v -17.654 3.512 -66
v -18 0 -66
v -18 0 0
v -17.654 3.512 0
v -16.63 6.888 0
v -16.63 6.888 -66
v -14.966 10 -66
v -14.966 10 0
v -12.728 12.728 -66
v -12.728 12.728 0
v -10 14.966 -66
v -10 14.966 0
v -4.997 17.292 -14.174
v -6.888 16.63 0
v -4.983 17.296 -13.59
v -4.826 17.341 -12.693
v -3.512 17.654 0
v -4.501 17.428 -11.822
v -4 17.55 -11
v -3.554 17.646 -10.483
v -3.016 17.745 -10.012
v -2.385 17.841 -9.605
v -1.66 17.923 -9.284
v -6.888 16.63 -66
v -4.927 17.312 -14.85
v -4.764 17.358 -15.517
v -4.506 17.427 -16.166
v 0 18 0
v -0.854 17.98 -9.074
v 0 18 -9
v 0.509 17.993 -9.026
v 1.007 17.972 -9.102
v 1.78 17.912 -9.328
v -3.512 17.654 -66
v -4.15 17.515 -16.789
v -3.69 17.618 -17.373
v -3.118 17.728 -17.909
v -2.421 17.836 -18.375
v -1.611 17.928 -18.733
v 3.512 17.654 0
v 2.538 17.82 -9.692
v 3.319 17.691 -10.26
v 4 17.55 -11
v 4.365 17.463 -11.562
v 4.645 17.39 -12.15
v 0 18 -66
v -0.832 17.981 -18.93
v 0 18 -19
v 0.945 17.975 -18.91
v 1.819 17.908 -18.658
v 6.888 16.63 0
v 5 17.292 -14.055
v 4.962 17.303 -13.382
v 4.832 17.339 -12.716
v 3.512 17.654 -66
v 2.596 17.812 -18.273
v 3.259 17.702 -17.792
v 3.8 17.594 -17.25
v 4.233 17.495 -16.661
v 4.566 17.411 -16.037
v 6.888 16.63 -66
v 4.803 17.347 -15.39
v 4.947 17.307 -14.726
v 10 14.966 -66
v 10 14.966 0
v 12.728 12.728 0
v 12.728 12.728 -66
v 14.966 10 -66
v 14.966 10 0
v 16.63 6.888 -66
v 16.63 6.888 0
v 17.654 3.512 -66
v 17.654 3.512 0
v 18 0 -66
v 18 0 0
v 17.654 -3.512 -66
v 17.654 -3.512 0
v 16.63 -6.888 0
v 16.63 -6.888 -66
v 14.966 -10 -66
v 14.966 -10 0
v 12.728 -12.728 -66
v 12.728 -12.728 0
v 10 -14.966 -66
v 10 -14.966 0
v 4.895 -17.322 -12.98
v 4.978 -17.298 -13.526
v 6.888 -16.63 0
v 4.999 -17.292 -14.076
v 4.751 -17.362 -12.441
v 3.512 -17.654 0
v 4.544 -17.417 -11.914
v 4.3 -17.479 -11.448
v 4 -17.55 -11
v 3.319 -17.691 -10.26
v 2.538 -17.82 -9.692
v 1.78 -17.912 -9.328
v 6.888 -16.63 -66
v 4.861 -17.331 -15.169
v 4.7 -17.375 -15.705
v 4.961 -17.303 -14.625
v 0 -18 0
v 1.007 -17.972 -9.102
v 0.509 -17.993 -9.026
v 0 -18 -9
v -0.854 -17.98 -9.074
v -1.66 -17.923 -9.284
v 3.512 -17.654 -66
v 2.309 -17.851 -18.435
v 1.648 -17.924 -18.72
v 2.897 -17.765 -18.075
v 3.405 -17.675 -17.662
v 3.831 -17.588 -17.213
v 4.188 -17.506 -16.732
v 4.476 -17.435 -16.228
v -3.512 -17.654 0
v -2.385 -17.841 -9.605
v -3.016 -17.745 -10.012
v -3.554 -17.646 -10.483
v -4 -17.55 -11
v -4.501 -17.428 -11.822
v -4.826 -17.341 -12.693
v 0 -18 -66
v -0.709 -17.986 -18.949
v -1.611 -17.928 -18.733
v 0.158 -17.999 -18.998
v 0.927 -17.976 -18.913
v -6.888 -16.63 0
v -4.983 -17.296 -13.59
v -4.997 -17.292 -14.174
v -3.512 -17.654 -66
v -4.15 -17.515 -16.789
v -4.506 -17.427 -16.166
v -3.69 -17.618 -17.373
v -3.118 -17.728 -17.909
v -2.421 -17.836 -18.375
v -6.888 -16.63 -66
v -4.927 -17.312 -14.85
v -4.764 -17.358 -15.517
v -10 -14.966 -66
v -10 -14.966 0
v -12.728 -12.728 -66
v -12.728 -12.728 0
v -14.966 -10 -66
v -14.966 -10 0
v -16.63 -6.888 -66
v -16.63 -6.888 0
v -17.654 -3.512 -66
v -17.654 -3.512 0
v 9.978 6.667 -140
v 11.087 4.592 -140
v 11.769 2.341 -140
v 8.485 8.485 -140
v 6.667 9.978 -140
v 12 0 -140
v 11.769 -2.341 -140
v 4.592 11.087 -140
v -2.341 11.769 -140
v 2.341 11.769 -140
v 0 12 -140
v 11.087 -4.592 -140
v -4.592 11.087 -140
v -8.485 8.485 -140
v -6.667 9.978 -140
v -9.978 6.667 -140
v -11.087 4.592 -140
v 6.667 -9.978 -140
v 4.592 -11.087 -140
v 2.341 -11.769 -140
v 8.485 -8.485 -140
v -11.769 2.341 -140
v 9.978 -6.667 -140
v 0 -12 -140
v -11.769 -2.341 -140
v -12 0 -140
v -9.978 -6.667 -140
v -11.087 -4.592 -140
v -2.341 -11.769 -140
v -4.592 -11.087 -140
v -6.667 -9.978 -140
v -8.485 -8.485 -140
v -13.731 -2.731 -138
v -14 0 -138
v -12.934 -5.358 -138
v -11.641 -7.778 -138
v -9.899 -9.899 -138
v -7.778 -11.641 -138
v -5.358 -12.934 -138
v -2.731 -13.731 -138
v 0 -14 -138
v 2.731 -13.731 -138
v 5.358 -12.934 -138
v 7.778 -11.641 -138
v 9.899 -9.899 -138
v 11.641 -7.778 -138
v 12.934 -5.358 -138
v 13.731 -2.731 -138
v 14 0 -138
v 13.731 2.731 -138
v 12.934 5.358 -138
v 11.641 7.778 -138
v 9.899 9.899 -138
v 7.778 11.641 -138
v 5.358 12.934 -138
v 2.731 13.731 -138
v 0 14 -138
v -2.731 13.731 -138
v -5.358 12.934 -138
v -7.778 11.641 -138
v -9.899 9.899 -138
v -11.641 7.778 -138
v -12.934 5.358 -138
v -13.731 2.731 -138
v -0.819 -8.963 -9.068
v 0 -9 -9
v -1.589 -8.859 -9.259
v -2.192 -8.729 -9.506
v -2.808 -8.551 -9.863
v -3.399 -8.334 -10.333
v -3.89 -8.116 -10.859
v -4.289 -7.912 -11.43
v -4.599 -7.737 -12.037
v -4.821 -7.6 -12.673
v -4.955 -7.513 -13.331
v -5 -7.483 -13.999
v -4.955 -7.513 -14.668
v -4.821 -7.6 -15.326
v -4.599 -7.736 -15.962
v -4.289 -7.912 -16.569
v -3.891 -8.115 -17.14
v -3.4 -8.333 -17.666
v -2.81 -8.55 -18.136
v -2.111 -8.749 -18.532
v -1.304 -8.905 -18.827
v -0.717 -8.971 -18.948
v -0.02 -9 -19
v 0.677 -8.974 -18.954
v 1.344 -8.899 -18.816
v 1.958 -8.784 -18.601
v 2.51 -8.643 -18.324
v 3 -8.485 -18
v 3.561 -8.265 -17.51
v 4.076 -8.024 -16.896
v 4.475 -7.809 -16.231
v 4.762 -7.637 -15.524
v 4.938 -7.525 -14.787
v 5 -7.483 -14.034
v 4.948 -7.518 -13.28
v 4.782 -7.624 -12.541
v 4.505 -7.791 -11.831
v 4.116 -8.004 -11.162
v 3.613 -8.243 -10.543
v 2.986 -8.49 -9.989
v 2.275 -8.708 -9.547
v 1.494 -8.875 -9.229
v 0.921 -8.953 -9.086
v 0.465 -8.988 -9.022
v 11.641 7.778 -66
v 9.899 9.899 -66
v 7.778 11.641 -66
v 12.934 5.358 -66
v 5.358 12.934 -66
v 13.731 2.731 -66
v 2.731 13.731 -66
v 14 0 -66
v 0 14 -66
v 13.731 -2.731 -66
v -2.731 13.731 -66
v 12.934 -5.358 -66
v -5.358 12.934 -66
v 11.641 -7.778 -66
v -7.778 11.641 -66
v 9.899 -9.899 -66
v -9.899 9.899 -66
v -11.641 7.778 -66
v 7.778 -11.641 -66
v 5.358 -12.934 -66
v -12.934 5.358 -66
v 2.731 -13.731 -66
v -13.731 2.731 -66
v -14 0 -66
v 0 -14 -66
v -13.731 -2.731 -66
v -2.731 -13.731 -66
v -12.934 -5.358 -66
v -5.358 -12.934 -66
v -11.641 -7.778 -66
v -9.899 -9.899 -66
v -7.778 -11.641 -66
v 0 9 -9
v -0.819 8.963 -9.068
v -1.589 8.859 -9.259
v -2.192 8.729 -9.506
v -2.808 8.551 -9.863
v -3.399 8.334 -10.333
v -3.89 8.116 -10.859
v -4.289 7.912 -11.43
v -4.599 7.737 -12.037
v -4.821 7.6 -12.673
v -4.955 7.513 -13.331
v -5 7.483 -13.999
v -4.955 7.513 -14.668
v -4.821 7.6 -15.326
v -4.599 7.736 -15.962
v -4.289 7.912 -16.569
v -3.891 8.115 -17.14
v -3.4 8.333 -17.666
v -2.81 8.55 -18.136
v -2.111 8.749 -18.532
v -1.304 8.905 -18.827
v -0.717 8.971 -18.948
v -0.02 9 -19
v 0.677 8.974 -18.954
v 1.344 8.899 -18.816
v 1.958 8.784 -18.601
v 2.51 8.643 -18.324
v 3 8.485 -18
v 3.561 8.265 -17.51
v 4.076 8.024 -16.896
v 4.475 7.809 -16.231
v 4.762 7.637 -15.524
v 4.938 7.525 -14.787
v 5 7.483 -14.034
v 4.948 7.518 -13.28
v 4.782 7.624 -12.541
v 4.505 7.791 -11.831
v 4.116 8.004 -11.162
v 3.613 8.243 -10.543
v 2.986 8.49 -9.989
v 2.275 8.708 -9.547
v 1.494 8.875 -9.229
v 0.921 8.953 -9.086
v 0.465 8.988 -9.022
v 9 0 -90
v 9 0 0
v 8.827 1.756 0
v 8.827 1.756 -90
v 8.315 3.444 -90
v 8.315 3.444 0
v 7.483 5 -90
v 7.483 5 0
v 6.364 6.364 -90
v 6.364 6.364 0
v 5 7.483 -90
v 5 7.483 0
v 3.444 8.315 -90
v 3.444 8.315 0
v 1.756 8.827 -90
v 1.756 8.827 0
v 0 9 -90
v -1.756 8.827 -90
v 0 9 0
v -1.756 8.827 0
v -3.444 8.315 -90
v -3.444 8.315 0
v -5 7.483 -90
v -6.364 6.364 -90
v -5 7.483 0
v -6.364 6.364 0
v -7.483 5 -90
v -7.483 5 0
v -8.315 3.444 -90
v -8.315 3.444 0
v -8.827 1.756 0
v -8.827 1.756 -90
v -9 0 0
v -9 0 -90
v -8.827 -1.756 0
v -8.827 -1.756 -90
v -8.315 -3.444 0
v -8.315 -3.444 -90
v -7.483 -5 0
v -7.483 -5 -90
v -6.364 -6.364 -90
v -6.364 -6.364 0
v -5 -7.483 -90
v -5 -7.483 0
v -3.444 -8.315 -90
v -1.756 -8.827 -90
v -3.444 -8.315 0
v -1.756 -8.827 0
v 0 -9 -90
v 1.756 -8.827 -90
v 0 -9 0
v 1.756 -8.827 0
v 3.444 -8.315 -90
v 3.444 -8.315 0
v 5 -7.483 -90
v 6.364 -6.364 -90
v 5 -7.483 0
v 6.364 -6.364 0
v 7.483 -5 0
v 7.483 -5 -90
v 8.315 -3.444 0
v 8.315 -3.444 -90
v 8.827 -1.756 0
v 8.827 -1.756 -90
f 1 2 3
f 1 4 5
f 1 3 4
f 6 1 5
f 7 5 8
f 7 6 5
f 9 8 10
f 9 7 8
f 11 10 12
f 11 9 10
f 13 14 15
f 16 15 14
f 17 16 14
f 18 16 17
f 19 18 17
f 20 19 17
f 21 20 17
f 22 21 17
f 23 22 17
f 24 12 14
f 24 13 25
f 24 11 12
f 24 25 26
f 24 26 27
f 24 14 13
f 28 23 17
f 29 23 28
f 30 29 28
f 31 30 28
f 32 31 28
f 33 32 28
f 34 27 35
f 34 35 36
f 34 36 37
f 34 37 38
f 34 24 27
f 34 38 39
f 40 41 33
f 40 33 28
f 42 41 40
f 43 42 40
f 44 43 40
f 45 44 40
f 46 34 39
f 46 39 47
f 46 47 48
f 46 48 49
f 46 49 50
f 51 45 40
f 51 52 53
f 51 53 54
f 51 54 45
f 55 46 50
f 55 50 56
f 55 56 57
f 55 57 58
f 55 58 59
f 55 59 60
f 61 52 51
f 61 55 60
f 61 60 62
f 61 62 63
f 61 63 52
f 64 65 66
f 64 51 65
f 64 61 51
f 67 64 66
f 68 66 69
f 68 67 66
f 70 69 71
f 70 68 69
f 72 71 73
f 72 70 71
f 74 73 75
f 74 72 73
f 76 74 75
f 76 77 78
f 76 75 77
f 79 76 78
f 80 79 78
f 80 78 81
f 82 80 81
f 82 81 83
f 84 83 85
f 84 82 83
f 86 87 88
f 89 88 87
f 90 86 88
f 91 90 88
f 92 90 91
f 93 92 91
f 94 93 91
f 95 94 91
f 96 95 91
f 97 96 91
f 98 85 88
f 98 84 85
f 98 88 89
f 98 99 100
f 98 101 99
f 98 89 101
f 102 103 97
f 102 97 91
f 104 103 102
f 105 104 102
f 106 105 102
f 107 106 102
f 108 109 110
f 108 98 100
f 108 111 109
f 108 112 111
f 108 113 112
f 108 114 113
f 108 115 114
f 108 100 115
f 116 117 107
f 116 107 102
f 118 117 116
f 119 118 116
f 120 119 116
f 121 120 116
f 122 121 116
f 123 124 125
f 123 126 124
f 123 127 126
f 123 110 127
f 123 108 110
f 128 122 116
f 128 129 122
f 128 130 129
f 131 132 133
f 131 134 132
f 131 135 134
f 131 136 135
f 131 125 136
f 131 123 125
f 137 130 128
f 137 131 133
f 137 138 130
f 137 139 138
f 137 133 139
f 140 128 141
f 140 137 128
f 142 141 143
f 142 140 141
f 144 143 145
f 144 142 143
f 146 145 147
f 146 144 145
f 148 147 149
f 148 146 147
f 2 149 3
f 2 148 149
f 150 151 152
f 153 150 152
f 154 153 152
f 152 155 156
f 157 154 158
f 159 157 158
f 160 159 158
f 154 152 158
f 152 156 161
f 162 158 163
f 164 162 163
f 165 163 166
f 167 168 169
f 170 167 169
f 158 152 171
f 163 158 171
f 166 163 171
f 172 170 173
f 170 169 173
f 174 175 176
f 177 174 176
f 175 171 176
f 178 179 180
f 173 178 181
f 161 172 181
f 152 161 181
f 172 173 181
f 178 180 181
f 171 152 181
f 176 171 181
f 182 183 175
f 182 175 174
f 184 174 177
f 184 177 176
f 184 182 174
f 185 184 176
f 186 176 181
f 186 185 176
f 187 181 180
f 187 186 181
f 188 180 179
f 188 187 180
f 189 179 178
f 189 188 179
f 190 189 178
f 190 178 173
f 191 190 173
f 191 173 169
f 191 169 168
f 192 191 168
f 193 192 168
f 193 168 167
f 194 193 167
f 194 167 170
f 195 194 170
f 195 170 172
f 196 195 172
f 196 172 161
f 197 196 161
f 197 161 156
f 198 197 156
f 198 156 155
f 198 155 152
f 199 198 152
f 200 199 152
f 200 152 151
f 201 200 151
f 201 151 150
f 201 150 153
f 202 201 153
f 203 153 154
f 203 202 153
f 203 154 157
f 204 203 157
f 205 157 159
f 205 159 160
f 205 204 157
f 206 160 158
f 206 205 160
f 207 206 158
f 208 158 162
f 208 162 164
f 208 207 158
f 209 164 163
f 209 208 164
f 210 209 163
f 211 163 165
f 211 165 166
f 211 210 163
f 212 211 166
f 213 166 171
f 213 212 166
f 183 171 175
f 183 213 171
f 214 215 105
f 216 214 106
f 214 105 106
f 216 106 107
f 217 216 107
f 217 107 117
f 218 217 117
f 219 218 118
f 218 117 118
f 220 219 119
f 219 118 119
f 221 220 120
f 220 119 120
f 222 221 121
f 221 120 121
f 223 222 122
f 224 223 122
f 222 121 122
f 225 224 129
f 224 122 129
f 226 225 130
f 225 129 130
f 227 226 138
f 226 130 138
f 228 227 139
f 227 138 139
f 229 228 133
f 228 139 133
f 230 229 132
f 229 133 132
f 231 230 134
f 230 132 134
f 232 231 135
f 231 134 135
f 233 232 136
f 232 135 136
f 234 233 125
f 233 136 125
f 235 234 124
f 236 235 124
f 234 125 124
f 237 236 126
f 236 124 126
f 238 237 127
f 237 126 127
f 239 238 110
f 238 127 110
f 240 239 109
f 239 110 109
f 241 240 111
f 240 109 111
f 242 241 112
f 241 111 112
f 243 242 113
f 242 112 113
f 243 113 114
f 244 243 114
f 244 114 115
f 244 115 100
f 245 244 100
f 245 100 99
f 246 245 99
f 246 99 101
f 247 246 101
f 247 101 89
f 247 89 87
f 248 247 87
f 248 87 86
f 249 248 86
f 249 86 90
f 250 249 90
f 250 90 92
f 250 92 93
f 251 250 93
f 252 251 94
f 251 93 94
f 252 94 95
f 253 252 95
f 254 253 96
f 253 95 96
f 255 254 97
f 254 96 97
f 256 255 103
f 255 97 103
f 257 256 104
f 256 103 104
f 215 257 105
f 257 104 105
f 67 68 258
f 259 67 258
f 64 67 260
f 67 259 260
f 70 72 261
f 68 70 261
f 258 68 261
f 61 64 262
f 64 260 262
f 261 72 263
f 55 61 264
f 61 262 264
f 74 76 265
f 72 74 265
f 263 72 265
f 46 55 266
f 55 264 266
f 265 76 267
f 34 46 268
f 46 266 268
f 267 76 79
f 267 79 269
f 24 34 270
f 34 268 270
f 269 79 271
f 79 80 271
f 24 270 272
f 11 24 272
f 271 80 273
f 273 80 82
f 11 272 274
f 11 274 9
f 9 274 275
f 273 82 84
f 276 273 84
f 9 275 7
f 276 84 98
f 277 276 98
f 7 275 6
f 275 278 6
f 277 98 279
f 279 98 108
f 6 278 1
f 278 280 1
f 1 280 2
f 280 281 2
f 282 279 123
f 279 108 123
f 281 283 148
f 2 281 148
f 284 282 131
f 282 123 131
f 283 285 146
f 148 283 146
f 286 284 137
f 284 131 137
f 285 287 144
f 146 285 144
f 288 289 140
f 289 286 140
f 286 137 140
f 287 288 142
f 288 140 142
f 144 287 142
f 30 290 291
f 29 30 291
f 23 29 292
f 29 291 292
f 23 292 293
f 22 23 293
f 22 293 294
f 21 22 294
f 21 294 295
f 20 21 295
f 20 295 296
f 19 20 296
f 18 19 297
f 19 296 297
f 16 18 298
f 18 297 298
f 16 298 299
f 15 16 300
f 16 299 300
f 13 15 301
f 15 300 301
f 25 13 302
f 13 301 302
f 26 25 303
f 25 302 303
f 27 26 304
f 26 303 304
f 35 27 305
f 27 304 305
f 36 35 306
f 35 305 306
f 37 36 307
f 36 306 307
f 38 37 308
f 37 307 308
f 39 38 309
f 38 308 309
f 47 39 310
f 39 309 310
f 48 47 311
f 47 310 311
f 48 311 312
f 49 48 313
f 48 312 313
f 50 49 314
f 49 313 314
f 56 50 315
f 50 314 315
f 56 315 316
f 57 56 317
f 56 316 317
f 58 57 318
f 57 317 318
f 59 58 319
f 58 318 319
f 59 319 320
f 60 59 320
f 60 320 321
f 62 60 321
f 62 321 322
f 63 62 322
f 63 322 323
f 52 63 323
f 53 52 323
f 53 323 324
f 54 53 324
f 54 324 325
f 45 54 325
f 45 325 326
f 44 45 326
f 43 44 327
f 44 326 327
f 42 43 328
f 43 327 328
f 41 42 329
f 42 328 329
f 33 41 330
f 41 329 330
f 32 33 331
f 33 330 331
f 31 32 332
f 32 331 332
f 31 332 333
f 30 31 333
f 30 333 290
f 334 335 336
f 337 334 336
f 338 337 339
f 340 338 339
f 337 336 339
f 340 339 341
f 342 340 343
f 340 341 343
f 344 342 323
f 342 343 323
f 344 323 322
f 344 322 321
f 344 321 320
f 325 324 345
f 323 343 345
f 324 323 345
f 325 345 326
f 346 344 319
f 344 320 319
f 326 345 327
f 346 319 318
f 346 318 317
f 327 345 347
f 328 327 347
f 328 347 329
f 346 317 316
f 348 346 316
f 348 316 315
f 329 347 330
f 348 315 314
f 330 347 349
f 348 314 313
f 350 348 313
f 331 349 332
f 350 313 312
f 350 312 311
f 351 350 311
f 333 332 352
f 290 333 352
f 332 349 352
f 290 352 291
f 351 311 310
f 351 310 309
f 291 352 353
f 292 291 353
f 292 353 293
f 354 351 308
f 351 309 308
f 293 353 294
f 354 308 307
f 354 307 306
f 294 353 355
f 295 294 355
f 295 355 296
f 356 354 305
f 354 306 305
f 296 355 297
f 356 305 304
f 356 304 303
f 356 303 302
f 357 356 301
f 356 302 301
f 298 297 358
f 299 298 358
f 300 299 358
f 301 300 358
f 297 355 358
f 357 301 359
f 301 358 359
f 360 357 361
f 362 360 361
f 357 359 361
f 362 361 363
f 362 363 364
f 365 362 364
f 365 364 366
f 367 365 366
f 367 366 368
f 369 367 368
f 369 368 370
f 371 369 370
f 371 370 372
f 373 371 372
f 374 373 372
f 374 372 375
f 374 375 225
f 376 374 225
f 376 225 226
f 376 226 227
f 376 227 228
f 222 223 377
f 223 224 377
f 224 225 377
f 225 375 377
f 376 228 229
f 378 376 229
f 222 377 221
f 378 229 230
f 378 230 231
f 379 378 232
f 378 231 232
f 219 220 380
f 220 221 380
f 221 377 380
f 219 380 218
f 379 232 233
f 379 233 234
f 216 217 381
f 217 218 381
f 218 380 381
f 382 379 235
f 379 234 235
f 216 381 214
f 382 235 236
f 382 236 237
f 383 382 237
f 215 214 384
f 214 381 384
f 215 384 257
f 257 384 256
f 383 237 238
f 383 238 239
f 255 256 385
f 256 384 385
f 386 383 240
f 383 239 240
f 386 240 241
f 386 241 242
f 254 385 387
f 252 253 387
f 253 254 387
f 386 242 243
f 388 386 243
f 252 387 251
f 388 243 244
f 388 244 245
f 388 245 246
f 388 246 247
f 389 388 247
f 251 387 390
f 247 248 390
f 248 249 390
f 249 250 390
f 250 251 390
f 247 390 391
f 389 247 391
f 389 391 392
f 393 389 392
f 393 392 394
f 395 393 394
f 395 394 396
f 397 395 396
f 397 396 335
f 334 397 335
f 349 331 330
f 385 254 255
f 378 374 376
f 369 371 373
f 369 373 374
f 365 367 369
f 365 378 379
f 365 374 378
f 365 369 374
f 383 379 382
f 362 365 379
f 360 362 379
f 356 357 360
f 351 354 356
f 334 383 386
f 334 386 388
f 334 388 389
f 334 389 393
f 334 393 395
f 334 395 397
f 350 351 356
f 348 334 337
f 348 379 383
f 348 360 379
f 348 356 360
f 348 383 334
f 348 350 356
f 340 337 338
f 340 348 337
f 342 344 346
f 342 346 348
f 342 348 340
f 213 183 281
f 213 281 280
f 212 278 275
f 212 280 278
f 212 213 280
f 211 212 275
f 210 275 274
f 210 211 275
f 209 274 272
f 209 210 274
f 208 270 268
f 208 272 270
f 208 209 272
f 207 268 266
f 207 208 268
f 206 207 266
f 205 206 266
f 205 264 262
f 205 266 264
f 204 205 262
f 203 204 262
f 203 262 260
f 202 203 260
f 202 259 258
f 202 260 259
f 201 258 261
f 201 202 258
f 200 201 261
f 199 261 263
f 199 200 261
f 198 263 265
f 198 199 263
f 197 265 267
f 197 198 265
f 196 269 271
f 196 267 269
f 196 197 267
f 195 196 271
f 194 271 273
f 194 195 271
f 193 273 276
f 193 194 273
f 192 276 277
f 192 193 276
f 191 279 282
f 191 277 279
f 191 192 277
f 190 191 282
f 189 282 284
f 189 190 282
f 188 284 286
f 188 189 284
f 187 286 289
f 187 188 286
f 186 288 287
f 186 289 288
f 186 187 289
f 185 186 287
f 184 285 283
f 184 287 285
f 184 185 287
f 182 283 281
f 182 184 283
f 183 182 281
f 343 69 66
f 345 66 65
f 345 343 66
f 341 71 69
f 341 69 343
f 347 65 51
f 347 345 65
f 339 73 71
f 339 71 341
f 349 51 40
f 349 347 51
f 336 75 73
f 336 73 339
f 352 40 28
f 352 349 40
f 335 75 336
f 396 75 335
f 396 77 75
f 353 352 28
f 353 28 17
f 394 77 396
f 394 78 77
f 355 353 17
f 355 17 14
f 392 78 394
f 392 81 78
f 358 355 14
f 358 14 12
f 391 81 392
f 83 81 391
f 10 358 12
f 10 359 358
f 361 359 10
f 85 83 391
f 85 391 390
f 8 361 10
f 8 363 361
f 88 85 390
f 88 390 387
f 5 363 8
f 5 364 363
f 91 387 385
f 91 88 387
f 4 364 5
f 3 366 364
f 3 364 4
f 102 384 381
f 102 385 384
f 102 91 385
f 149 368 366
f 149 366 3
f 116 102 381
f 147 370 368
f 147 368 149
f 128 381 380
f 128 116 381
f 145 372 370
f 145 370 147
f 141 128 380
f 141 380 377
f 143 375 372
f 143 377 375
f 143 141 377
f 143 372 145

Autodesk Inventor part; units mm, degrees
ref_plane "YZ Plane" through (0, 0, 0) normal (1, 0, 0) x (0, 1, 0)
ref_plane "XY Plane" through (0, 0, 0) normal (0, 0, 1) x (1, 0, 0)
sketch "Skizze1" plane through (0, 0, 0) normal (0, 1, 0) x (-1, 0, 0)
  line L0 (0, 0) -> (18, 0)
  line L1 (18, 0) -> (18, -5)
  line L2 (18, -5) -> (18, -5)
  line L3 (18, -5) -> (18, -11)
  line L4 (18, -11) -> (18, -11)
  line L5 (18, -11) -> (18, -66)
  line L6 (18, -66) -> (14, -66)
  line L7 (14, -66) -> (14, -140)
  line L8 (14, -140) -> (0, -140)
  line L9 (0, -140) -> (0, 0)
  point P0 (18, -8)
  dimension "d0" = 74
  dimension "d1" = 66
  dimension "d5" = 36
  dimension "d6" = 28
revolve "Umdrehung1" add sketch "Skizze1" angle 360 about axis through (0, 0, -140) along (0, 0, 1)
ref_plane "Arbeitsebene1" through (0, 18, 0) normal (0, 1, 0) x (-1, 0, 0)
sketch "Skizze2" plane through (0, 18, 0) normal (0, 1, 0) x (-1, 0, 0)
  point P0 (0, 0)
  point P1 (0, -14)
  dimension "d9" = 14
hole "Bohrung1" at (0, 18, -14) direction (0, -1, 0) diameter 10 end through all
sketch "Skizze3" plane through (0, 0, 0) normal (0, 0, 1) x (1, 0, 0)
  circle A0 centre (0, 0) radius 9
  dimension "d17" = 18
extrude "Extrusion1" cut sketch "Skizze3" against normal blind 90
chamfer "Fasen1" distance 2 angle 45 1 edges at (14, 0, -140)
properties part number "19"
